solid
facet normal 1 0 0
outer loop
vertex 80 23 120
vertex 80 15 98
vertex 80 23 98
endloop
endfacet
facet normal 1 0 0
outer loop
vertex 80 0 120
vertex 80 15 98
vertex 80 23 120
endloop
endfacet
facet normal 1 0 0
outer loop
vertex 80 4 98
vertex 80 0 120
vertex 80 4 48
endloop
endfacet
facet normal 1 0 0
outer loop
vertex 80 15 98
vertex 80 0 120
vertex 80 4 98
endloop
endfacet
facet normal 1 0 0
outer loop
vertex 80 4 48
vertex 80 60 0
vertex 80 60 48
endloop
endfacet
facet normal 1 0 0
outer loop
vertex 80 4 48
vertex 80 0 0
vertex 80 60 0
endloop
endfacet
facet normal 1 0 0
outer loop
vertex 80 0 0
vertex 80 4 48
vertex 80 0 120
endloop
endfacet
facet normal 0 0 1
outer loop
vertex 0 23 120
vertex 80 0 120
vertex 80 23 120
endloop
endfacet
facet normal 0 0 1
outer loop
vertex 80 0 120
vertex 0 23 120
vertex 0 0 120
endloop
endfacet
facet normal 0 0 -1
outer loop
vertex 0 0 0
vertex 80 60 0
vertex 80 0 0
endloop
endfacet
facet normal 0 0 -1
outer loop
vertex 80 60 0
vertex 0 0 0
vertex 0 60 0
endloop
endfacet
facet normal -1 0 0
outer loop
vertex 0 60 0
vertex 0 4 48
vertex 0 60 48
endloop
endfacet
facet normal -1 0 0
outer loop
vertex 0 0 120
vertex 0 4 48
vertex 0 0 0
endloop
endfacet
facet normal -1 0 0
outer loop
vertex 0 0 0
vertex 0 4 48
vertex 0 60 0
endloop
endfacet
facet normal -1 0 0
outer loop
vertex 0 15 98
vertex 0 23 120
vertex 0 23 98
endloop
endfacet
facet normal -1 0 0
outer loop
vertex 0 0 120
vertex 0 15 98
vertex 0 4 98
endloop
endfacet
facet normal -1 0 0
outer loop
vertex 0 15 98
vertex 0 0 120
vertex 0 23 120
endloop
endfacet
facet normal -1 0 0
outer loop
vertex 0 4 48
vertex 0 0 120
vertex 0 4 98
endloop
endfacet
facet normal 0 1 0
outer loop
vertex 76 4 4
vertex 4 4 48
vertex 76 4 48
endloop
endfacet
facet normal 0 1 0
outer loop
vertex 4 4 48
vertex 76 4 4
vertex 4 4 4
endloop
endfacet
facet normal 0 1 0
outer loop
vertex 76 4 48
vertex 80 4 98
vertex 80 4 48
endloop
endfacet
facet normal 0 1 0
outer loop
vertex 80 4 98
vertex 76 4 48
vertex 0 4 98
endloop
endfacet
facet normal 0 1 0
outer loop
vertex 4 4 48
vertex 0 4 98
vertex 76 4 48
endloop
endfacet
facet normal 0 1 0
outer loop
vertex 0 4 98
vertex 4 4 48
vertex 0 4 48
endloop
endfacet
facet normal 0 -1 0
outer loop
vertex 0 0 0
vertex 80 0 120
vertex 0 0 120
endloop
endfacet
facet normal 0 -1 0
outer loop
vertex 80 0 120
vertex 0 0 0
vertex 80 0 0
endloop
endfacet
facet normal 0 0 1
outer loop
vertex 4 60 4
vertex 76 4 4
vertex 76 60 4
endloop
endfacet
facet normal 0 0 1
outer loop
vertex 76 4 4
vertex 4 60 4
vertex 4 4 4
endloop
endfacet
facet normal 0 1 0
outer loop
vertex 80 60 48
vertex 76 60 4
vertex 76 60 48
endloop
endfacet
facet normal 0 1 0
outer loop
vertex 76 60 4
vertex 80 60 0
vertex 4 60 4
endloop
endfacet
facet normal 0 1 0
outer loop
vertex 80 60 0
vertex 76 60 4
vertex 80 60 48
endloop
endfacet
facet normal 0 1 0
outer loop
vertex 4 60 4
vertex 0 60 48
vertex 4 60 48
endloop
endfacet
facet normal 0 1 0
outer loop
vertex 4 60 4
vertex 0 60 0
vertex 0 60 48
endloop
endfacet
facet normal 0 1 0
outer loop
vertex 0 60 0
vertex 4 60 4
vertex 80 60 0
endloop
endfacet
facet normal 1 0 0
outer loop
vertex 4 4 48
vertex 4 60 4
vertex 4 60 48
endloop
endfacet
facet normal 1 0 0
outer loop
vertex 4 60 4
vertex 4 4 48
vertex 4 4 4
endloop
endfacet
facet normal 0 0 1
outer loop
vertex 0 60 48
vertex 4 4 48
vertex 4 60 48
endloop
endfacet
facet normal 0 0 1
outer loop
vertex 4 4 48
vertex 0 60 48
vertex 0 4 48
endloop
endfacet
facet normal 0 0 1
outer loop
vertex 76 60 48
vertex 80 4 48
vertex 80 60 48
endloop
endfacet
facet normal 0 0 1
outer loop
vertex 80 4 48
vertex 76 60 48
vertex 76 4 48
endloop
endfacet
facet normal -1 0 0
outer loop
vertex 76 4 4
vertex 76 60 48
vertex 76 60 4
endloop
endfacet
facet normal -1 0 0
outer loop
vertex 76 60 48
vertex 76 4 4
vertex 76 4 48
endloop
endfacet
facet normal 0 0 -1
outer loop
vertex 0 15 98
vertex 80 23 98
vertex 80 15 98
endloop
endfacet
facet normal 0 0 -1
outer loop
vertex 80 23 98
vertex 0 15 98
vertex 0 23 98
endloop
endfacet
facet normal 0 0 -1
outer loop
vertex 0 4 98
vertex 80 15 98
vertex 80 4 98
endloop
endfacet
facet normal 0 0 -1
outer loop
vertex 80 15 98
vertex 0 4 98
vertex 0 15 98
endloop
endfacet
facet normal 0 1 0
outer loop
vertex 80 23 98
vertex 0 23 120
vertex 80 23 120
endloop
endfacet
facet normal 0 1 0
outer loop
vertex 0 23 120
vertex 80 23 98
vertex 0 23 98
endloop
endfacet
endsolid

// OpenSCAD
// ============================================================
// French Cleat System — Mount Plate + Tool Holder
// ============================================================
// Standard French cleat: 45° angle, typically 3/4" (19mm) thick plywood
// Adjust variables below. Works for wall-mounted storage.

// ---- CLEAT PARAMETERS (store these, reuse every mount) ----
cleat_width    = 200;  // Width of the cleat (mm) — your wall strip
cleat_height   = 40;   // Height of the cleat strip (mm)
cleat_angle    = 45;   // Always 45° for French cleat standard
cleat_material = 19;   // Plywood thickness (mm) — 3/4" = 19mm

// ---- MOUNT PARAMETERS ----
mount_width    = 80;   // Width of this specific mount/holder (mm)
mount_depth    = 60;   // How far it sticks out from wall (mm)
mount_height   = 120;  // Total height of mount (mm)
wall_t         = 4;    // Wall thickness of mount (mm)

// ---- CLEAT HOOK (the part that grabs the wall cleat) ----
module cleat_hook() {
    // Hook profile that slides onto 45° wall cleat
    hook_h = cleat_material + 3; // Slight clearance
    translate([0, 0, mount_height - hook_h])
    difference() {
        cube([mount_width, cleat_material + wall_t, hook_h]);
        // Cut 45° hook underside
        translate([0, wall_t, 0])
        rotate([0, 90, 0])
        linear_extrude(mount_width)
        polygon([[0,0],[cleat_material,0],[cleat_material, hook_h],[0, hook_h * 0.5]]);
    }
}

// ---- MOUNT BODY ----
module mount_body() {
    // Back plate
    cube([mount_width, wall_t, mount_height]);
    // Bottom shelf (for resting tools)
    translate([0, wall_t, 0])
        cube([mount_width, mount_depth - wall_t, wall_t]);
    // Side walls
    cube([wall_t, mount_depth, mount_height * 0.4]);
    translate([mount_width - wall_t, 0, 0])
        cube([wall_t, mount_depth, mount_height * 0.4]);
}

// ---- ASSEMBLE ----
mount_body();
cleat_hook();

// ---- WALL CLEAT (for reference / render separately) ----
module wall_cleat() {
    color("SaddleBrown")
    difference() {
        cube([cleat_width, cleat_material, cleat_height]);
        // 45° cut on top
        translate([-1, -0.1, cleat_height - cleat_material])
        rotate([0, 90, 0])
        linear_extrude(cleat_width + 2)
        polygon([[0,0],[cleat_material + 0.1, 0],[cleat_material + 0.1, cleat_material + 0.1]]);
    }
}

// Uncomment to visualize wall cleat:
// translate([0, -cleat_material - 10, 0]) wall_cleat();
